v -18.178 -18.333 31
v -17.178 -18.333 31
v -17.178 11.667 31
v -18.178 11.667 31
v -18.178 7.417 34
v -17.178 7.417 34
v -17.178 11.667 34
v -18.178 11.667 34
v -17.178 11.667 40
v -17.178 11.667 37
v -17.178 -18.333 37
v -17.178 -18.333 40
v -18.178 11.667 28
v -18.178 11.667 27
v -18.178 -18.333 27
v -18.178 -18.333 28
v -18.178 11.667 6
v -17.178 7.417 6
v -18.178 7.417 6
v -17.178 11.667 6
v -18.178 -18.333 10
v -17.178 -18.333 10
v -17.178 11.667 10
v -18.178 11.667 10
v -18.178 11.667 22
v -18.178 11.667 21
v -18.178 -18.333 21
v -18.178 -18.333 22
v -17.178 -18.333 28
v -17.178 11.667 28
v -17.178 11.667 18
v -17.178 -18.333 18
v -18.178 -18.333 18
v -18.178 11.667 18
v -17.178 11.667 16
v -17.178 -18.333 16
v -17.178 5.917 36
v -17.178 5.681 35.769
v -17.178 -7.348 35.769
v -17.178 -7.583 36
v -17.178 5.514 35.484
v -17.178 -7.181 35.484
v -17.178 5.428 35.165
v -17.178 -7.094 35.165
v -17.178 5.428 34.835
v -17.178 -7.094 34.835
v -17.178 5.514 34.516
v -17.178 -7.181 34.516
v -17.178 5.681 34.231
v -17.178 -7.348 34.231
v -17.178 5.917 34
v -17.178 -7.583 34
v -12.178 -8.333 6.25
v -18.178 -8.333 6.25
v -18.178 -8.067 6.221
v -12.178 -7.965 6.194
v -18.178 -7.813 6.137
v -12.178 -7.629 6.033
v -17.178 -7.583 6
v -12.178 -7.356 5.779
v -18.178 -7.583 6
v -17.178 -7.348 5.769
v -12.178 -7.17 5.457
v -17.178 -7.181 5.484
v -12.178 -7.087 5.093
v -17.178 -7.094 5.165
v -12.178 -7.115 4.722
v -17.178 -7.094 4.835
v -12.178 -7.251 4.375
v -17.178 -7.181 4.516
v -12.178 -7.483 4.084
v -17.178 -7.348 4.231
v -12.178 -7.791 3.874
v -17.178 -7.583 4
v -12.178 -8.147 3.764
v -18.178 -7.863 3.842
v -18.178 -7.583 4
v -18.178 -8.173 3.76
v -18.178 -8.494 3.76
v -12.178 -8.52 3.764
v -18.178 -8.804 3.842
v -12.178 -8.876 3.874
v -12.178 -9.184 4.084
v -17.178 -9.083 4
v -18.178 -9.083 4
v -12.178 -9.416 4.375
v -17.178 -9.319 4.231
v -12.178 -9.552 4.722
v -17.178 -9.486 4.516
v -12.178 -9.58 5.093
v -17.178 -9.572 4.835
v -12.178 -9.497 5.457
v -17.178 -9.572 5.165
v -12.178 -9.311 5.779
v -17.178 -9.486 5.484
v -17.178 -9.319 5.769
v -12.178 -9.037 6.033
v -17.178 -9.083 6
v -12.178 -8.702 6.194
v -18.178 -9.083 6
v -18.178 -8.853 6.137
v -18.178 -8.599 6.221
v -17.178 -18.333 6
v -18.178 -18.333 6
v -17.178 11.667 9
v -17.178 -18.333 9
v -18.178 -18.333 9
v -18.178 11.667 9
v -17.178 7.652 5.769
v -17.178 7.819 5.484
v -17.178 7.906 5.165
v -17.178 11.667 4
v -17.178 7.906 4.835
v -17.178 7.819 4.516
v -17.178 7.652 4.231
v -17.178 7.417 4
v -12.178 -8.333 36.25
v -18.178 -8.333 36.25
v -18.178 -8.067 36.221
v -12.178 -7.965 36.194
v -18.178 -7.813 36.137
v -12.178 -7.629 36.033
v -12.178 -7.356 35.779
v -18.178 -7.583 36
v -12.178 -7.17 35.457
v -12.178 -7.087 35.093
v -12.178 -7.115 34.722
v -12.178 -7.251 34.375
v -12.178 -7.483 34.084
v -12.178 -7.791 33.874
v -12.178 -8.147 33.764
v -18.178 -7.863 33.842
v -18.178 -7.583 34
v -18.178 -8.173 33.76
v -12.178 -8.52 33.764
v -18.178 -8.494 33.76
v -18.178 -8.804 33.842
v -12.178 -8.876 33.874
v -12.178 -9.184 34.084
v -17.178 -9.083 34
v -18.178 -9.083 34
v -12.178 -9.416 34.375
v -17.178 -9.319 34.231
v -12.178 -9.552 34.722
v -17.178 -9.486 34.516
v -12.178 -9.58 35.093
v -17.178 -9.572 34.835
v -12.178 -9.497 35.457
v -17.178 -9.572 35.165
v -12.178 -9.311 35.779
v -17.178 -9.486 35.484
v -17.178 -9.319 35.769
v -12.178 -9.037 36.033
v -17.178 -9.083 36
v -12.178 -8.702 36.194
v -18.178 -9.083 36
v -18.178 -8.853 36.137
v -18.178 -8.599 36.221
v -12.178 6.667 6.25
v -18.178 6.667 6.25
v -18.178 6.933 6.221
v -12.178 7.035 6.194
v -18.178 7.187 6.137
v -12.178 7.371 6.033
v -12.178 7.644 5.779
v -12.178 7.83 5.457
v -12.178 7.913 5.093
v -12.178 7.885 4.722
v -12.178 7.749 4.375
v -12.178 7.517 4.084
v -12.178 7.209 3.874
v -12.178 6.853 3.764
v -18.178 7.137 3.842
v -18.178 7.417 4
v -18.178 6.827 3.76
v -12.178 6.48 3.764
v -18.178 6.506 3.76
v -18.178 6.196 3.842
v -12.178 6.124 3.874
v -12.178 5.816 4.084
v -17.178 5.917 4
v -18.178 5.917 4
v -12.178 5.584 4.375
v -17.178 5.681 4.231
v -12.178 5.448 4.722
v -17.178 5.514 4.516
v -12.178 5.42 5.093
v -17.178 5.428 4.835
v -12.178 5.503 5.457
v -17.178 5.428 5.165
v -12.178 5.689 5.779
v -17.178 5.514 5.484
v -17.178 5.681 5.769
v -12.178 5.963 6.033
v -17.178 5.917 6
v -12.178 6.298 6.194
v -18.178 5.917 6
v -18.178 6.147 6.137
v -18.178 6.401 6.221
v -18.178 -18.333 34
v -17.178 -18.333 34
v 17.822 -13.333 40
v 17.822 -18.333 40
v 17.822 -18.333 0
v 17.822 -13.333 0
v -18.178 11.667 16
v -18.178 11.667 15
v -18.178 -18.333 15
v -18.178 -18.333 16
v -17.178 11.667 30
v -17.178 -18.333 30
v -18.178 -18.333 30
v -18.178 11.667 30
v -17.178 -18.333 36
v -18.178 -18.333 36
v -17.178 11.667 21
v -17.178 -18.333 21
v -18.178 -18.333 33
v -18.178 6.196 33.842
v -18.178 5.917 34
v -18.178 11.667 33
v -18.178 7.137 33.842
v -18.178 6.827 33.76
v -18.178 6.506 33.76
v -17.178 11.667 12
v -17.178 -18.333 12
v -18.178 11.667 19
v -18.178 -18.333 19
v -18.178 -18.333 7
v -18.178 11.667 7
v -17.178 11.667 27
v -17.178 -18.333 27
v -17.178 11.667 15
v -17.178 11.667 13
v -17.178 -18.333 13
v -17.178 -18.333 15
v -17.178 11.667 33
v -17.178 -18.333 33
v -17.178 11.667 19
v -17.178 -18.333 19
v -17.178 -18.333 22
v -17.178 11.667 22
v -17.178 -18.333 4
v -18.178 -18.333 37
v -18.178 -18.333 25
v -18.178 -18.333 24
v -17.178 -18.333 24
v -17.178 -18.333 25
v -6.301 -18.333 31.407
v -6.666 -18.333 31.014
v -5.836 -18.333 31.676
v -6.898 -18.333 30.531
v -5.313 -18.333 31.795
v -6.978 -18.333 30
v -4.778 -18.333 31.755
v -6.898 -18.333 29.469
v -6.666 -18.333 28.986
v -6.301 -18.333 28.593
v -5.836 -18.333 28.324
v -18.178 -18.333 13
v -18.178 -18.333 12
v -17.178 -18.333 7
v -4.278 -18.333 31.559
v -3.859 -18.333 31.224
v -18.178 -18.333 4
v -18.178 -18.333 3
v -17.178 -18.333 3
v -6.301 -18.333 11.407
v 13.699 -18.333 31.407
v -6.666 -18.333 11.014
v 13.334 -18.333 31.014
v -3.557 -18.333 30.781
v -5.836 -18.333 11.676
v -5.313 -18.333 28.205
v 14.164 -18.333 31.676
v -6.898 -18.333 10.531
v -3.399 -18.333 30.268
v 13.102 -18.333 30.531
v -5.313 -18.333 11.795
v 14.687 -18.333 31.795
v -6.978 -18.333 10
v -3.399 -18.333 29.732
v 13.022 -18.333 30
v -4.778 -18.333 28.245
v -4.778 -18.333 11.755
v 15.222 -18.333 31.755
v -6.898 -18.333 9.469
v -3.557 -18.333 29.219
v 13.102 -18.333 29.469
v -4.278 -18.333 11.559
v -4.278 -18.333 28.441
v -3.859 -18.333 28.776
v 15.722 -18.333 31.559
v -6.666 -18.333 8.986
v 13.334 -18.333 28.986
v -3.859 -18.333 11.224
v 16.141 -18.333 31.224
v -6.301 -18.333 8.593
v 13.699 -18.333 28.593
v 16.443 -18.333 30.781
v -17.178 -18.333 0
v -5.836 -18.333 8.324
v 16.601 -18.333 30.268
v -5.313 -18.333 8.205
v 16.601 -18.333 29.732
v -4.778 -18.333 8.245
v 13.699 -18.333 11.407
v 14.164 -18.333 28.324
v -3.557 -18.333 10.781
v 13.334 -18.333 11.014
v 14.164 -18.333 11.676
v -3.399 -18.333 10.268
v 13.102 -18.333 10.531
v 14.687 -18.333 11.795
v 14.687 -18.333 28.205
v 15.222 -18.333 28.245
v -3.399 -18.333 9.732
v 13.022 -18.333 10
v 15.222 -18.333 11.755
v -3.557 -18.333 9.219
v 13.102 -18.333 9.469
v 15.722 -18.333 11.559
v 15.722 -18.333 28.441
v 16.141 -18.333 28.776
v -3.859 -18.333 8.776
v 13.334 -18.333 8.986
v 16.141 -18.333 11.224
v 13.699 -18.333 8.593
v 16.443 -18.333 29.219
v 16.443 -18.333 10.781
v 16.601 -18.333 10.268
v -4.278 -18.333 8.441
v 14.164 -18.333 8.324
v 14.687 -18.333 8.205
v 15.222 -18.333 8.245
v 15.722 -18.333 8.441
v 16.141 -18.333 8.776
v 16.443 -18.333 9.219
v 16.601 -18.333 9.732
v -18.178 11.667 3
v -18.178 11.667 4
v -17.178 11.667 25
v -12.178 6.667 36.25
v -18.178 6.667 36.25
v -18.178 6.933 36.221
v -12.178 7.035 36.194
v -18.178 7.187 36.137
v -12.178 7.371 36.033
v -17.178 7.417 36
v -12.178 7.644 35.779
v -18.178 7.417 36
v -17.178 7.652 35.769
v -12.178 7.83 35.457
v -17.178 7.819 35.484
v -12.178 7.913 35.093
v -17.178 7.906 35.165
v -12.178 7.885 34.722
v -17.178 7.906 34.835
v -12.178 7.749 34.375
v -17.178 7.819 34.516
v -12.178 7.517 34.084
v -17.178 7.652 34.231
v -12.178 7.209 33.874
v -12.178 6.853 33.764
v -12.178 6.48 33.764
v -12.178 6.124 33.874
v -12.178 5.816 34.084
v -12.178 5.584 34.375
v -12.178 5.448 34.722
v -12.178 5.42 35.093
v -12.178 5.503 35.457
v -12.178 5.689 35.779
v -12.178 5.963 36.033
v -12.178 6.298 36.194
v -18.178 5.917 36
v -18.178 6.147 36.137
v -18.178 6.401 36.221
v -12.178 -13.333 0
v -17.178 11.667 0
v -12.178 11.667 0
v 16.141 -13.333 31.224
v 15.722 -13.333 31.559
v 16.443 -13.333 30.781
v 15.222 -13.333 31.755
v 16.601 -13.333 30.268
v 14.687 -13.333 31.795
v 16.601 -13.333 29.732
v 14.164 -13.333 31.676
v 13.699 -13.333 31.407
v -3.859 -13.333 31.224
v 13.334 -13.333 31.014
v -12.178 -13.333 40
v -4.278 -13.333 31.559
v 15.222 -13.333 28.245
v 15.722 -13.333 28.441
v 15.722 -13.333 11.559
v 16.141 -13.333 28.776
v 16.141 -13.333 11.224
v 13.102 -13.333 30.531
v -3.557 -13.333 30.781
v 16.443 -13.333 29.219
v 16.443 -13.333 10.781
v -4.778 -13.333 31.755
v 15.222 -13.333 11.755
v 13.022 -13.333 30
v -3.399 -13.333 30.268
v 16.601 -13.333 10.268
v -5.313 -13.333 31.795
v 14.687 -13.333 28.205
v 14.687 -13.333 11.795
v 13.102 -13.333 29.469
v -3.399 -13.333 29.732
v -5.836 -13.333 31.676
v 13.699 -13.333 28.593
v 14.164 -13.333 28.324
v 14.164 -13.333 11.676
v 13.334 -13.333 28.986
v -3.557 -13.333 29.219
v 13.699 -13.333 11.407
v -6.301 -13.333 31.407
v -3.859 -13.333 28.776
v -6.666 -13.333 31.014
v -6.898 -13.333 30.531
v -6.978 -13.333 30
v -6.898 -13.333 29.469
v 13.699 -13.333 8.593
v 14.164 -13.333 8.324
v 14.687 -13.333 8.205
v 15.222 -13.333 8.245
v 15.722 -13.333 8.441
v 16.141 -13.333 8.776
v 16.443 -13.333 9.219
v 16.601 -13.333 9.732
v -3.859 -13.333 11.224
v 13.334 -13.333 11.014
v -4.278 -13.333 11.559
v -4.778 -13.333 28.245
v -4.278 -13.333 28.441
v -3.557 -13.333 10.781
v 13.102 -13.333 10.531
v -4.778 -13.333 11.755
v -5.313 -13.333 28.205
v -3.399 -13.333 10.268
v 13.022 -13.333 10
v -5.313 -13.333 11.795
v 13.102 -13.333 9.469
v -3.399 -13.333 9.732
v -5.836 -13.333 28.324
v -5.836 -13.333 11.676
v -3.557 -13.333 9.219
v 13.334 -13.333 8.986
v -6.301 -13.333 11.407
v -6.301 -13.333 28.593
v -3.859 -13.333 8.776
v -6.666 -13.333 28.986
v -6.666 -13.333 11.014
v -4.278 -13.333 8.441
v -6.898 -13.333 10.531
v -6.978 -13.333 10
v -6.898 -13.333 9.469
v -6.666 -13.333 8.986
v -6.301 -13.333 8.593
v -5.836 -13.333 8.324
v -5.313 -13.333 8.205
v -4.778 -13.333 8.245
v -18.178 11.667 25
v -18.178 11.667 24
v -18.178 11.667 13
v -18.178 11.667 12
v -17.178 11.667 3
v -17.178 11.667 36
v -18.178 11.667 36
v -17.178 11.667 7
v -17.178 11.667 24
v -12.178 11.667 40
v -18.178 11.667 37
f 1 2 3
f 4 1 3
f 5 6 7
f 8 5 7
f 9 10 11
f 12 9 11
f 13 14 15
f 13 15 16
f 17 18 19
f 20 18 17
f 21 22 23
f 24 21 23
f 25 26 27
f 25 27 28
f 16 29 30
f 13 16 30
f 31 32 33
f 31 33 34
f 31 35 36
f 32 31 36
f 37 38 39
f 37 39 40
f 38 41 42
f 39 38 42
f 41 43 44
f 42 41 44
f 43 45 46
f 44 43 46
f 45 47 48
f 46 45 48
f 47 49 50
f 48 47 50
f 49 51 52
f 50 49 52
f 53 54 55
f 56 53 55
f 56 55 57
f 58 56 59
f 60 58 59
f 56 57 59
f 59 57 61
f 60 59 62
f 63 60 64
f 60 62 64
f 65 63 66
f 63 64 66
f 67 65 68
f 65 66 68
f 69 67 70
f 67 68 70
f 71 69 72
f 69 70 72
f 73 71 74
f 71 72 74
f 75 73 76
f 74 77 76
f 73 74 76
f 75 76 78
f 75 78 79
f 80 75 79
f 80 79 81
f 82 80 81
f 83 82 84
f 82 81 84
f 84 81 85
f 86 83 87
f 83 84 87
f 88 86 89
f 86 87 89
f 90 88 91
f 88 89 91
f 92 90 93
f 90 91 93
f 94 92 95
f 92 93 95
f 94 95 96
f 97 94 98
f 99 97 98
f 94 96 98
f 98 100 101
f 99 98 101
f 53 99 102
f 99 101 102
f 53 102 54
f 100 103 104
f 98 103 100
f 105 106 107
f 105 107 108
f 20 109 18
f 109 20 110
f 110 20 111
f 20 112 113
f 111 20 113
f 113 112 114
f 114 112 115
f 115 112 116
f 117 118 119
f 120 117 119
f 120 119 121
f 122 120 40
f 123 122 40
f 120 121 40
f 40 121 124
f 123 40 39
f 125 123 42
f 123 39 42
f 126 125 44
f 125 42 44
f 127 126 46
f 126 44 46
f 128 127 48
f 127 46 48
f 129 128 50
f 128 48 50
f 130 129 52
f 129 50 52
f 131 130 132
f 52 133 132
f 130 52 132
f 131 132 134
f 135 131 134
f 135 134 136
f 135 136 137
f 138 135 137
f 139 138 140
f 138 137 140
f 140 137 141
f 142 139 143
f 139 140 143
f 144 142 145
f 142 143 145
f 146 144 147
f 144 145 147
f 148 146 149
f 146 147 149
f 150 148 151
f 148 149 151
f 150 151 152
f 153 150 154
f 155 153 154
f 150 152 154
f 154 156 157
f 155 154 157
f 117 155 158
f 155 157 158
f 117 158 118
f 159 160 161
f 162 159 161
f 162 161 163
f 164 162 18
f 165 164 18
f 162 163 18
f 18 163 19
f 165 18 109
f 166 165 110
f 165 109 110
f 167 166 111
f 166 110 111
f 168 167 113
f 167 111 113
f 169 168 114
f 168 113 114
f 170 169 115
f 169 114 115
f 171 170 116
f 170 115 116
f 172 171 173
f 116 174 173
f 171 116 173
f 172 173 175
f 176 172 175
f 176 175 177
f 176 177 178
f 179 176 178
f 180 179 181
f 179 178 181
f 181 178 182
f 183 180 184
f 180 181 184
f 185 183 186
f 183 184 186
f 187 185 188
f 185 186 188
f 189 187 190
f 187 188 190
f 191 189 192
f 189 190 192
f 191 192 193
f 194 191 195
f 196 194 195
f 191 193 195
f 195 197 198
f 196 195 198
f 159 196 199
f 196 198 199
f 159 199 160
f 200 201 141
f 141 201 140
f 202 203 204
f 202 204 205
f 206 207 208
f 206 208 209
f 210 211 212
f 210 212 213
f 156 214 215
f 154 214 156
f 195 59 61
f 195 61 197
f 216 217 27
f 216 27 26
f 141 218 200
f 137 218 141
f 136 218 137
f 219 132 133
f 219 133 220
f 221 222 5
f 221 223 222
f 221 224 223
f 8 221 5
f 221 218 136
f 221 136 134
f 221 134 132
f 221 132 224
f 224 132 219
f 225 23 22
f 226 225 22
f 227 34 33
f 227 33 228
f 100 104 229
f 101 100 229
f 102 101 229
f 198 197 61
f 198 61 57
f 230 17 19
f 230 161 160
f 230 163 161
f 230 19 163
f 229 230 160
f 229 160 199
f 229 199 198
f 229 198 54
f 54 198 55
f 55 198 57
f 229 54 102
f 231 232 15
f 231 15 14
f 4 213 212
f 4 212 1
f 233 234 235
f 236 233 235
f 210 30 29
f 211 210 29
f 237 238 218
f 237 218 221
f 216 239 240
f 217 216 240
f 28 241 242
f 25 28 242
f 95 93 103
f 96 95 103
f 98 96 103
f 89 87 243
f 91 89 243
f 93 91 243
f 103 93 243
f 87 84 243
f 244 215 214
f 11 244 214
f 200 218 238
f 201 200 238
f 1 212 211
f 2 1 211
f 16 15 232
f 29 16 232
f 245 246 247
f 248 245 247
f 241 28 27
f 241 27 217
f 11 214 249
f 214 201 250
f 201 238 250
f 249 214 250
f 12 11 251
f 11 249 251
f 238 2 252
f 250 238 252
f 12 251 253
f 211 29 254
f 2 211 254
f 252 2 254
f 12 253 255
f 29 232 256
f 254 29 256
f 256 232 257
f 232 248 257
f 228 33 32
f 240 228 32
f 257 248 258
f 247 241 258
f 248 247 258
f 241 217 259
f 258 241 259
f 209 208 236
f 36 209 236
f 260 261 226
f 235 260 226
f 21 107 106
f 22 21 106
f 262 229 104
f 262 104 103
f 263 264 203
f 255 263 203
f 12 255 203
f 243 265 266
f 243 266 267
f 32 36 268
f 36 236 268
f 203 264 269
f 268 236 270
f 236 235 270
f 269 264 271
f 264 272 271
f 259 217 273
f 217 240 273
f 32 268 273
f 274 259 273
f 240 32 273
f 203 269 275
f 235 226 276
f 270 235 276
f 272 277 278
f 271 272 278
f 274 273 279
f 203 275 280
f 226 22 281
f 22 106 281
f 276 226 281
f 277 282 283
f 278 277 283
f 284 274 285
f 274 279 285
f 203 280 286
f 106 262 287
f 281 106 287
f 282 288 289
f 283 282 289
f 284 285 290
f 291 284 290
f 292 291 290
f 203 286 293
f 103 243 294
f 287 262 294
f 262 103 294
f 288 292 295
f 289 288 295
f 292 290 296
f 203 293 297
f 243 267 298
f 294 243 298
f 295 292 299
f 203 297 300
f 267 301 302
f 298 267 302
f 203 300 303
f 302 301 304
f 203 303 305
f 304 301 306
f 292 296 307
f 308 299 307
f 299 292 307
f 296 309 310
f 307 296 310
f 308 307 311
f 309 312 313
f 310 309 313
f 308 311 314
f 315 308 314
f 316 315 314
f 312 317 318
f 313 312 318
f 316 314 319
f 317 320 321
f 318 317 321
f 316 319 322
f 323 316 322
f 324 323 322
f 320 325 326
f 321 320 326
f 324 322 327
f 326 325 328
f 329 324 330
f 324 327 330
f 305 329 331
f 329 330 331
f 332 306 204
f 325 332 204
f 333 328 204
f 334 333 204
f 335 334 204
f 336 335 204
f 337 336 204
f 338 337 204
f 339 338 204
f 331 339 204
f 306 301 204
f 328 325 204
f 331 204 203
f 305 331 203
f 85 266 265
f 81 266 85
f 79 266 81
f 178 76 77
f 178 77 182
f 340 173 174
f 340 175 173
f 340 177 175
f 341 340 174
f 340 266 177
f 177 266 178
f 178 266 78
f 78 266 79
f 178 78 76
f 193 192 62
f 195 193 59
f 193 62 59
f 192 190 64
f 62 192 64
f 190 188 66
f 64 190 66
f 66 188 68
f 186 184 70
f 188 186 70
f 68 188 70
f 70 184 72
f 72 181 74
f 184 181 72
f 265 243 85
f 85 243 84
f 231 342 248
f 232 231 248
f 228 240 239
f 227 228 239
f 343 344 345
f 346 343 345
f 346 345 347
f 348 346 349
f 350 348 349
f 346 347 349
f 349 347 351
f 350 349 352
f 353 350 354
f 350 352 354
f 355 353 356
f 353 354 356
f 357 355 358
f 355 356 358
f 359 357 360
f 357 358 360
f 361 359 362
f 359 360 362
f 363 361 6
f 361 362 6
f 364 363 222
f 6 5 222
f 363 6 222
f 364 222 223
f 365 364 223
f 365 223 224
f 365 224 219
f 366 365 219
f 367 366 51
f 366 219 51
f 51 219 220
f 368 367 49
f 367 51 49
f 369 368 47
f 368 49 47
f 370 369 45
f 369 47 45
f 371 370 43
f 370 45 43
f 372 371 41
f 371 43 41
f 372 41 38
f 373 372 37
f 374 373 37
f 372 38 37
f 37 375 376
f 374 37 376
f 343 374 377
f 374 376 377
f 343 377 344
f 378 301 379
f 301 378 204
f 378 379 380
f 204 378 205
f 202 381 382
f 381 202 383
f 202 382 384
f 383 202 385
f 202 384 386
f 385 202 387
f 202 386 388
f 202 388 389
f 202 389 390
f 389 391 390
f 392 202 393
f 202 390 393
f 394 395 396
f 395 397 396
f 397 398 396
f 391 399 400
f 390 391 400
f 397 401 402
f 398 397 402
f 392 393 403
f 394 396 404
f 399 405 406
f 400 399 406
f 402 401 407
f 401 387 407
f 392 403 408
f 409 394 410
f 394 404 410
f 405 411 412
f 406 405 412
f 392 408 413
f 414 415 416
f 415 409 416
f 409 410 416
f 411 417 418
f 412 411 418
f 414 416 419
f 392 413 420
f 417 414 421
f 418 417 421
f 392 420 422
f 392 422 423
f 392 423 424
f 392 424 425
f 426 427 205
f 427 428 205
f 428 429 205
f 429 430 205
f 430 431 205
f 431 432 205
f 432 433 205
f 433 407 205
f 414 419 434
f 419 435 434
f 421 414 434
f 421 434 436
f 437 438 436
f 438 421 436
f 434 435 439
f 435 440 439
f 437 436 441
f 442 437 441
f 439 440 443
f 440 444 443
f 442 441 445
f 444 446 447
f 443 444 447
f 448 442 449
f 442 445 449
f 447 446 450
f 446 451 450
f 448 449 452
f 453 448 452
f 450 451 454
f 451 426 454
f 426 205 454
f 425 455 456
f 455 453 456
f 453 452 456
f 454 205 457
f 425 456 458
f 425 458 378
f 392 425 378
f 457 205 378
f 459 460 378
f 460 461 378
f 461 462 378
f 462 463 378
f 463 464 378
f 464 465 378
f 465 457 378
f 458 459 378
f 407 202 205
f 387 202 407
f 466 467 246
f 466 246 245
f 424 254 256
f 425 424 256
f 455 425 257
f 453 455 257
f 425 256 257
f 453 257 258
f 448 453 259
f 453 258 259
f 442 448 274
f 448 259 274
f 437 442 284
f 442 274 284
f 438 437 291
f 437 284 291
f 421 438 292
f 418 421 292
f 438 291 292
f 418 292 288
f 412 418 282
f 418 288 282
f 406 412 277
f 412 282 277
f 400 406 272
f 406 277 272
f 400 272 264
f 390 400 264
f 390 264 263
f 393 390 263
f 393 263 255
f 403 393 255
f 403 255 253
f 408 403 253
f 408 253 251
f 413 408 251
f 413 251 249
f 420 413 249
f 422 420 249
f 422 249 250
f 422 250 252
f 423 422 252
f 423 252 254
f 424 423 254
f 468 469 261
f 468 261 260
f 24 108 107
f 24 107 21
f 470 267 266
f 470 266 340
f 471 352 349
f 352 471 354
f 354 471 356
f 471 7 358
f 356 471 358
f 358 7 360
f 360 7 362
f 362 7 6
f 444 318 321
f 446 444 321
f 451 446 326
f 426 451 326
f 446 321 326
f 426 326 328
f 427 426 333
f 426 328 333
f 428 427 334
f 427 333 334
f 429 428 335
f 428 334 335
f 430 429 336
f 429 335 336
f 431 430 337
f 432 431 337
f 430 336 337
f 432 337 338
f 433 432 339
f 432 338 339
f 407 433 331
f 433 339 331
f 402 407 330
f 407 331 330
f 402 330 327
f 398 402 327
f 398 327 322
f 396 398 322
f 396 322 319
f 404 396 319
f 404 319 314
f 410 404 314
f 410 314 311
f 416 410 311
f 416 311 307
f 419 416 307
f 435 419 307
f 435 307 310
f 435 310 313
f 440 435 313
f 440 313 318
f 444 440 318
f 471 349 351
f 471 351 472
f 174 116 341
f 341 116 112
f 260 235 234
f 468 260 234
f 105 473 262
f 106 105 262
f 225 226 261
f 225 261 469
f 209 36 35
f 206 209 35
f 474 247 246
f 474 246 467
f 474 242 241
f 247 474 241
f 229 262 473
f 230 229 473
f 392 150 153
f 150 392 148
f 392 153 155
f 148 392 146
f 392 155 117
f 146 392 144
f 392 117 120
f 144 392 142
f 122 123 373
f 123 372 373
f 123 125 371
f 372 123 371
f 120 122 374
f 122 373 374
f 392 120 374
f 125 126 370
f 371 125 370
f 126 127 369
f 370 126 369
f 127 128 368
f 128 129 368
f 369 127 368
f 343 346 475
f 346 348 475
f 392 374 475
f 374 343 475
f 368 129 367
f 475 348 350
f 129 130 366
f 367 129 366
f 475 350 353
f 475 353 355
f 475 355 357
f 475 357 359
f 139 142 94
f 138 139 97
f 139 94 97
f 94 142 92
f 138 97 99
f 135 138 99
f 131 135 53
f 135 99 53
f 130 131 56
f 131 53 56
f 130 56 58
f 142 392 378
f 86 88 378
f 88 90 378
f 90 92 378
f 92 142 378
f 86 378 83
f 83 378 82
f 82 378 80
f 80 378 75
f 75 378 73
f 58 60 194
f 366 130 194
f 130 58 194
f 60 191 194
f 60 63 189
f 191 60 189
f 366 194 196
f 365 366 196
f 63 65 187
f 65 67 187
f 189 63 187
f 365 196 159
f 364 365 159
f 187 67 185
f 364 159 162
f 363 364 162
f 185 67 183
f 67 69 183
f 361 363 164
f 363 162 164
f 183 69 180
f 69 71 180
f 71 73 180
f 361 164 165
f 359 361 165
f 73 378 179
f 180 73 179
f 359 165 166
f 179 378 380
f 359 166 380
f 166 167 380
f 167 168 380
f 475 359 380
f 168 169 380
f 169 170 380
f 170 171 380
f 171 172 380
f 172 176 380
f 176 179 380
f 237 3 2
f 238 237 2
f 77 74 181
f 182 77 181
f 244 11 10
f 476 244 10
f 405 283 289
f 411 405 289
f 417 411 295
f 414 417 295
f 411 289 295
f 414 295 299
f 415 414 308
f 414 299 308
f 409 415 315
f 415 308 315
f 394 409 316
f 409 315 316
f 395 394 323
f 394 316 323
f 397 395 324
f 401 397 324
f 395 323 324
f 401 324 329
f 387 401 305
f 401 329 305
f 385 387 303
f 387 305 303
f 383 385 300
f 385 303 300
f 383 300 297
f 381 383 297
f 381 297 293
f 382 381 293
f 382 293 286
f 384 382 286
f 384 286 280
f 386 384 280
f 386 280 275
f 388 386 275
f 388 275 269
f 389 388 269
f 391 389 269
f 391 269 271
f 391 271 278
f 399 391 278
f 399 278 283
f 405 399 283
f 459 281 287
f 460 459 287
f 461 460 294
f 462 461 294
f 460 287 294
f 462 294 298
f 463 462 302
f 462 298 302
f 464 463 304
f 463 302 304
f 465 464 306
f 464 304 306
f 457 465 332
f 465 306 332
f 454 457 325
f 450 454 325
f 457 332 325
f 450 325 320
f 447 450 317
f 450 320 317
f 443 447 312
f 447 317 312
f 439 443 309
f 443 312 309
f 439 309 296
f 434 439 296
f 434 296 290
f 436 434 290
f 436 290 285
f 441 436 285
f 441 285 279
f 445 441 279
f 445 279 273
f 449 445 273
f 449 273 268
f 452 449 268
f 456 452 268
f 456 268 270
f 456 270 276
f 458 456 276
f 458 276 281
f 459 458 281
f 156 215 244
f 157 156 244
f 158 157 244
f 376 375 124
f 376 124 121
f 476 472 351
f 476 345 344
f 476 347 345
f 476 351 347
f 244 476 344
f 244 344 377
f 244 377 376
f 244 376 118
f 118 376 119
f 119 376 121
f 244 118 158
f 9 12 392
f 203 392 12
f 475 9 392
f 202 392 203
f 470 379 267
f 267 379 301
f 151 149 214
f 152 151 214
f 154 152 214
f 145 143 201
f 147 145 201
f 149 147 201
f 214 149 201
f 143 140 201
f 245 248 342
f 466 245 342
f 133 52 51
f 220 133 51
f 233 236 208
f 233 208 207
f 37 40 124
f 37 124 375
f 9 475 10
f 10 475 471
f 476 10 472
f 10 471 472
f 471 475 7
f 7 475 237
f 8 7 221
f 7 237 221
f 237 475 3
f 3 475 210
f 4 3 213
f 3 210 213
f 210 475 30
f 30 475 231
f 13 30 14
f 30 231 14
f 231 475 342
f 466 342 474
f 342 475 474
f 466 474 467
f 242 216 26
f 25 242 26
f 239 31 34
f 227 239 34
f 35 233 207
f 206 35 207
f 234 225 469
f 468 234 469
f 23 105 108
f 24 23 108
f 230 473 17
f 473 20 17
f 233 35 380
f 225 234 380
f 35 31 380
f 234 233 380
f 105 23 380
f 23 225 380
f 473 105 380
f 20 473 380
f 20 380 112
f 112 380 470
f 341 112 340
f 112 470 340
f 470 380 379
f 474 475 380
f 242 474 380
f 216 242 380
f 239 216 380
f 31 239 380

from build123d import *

# Parameters (mm, degrees)
BOSS_EXTRU_1_DEPTH                        = 40
ESQUISSE2_W                               = 1
ESQUISSE2_H                               = 30
EXTRU_MINCE2_DEPTH                        = 1
R_P_TITION_LIN_AIRE1_COUNT                = 12
R_P_TITION_LIN_AIRE1_PITCH                = 3
TROU_POUR_TARAUDAGE_POUR_TROU_TARAUD_M3_D = 2.5
D_GAGEMENT_M33_D                          = 3.6


with BuildPart() as part:
    # Esquisse1 → Boss.-Extru.1 (new body)
    with BuildSketch(Plane.XY):
        Polygon((-17.178456592, 11.666666667), (-17.178456592, -18.333333333), (17.821543408, -18.333333333), (17.821543408, -13.333333333), (-12.178456592, -13.333333333), (-12.178456592, 11.666666667), align=None)
    extrude(amount=BOSS_EXTRU_1_DEPTH)

    # Esquisse2 → Extru.-Mince2 (add)
    with BuildSketch(Plane.ZY.offset(17.178456592)):
        with Locations((36.5, -3.333333333)):
            Rectangle(ESQUISSE2_W, ESQUISSE2_H)
    extru_mince2 = extrude(amount=EXTRU_MINCE2_DEPTH)

    # Répétition linéaire1: Extru.-Mince2 ×12
    with Locations(*[(0, 0, -i * R_P_TITION_LIN_AIRE1_PITCH) for i in range(1, R_P_TITION_LIN_AIRE1_COUNT)]):
        add(extru_mince2)

    # Trou pour taraudage pour trou taraudé M34 (through all)
    with Locations(Plane(origin=(-12.178456592, 0, 0), x_dir=(0, 0, -1), z_dir=(1, 0, 0))):
        with Locations((-5, 6.666666667), (-35, 6.666666667), (-35, -8.333333333), (-5, -8.333333333)):
            Hole(TROU_POUR_TARAUDAGE_POUR_TROU_TARAUD_M3_D / 2)

    # Dégagement M33 (through all)
    with Locations(Plane(origin=(0, -13.333333333, 0), x_dir=(1, 0, 0), z_dir=(0, 1, 0))):
        with Locations((14.821543408, -10), (14.821543408, -30), (-5.178456592, -10), (-5.178456592, -30)):
            Hole(D_GAGEMENT_M33_D / 2)


solid = part.part
